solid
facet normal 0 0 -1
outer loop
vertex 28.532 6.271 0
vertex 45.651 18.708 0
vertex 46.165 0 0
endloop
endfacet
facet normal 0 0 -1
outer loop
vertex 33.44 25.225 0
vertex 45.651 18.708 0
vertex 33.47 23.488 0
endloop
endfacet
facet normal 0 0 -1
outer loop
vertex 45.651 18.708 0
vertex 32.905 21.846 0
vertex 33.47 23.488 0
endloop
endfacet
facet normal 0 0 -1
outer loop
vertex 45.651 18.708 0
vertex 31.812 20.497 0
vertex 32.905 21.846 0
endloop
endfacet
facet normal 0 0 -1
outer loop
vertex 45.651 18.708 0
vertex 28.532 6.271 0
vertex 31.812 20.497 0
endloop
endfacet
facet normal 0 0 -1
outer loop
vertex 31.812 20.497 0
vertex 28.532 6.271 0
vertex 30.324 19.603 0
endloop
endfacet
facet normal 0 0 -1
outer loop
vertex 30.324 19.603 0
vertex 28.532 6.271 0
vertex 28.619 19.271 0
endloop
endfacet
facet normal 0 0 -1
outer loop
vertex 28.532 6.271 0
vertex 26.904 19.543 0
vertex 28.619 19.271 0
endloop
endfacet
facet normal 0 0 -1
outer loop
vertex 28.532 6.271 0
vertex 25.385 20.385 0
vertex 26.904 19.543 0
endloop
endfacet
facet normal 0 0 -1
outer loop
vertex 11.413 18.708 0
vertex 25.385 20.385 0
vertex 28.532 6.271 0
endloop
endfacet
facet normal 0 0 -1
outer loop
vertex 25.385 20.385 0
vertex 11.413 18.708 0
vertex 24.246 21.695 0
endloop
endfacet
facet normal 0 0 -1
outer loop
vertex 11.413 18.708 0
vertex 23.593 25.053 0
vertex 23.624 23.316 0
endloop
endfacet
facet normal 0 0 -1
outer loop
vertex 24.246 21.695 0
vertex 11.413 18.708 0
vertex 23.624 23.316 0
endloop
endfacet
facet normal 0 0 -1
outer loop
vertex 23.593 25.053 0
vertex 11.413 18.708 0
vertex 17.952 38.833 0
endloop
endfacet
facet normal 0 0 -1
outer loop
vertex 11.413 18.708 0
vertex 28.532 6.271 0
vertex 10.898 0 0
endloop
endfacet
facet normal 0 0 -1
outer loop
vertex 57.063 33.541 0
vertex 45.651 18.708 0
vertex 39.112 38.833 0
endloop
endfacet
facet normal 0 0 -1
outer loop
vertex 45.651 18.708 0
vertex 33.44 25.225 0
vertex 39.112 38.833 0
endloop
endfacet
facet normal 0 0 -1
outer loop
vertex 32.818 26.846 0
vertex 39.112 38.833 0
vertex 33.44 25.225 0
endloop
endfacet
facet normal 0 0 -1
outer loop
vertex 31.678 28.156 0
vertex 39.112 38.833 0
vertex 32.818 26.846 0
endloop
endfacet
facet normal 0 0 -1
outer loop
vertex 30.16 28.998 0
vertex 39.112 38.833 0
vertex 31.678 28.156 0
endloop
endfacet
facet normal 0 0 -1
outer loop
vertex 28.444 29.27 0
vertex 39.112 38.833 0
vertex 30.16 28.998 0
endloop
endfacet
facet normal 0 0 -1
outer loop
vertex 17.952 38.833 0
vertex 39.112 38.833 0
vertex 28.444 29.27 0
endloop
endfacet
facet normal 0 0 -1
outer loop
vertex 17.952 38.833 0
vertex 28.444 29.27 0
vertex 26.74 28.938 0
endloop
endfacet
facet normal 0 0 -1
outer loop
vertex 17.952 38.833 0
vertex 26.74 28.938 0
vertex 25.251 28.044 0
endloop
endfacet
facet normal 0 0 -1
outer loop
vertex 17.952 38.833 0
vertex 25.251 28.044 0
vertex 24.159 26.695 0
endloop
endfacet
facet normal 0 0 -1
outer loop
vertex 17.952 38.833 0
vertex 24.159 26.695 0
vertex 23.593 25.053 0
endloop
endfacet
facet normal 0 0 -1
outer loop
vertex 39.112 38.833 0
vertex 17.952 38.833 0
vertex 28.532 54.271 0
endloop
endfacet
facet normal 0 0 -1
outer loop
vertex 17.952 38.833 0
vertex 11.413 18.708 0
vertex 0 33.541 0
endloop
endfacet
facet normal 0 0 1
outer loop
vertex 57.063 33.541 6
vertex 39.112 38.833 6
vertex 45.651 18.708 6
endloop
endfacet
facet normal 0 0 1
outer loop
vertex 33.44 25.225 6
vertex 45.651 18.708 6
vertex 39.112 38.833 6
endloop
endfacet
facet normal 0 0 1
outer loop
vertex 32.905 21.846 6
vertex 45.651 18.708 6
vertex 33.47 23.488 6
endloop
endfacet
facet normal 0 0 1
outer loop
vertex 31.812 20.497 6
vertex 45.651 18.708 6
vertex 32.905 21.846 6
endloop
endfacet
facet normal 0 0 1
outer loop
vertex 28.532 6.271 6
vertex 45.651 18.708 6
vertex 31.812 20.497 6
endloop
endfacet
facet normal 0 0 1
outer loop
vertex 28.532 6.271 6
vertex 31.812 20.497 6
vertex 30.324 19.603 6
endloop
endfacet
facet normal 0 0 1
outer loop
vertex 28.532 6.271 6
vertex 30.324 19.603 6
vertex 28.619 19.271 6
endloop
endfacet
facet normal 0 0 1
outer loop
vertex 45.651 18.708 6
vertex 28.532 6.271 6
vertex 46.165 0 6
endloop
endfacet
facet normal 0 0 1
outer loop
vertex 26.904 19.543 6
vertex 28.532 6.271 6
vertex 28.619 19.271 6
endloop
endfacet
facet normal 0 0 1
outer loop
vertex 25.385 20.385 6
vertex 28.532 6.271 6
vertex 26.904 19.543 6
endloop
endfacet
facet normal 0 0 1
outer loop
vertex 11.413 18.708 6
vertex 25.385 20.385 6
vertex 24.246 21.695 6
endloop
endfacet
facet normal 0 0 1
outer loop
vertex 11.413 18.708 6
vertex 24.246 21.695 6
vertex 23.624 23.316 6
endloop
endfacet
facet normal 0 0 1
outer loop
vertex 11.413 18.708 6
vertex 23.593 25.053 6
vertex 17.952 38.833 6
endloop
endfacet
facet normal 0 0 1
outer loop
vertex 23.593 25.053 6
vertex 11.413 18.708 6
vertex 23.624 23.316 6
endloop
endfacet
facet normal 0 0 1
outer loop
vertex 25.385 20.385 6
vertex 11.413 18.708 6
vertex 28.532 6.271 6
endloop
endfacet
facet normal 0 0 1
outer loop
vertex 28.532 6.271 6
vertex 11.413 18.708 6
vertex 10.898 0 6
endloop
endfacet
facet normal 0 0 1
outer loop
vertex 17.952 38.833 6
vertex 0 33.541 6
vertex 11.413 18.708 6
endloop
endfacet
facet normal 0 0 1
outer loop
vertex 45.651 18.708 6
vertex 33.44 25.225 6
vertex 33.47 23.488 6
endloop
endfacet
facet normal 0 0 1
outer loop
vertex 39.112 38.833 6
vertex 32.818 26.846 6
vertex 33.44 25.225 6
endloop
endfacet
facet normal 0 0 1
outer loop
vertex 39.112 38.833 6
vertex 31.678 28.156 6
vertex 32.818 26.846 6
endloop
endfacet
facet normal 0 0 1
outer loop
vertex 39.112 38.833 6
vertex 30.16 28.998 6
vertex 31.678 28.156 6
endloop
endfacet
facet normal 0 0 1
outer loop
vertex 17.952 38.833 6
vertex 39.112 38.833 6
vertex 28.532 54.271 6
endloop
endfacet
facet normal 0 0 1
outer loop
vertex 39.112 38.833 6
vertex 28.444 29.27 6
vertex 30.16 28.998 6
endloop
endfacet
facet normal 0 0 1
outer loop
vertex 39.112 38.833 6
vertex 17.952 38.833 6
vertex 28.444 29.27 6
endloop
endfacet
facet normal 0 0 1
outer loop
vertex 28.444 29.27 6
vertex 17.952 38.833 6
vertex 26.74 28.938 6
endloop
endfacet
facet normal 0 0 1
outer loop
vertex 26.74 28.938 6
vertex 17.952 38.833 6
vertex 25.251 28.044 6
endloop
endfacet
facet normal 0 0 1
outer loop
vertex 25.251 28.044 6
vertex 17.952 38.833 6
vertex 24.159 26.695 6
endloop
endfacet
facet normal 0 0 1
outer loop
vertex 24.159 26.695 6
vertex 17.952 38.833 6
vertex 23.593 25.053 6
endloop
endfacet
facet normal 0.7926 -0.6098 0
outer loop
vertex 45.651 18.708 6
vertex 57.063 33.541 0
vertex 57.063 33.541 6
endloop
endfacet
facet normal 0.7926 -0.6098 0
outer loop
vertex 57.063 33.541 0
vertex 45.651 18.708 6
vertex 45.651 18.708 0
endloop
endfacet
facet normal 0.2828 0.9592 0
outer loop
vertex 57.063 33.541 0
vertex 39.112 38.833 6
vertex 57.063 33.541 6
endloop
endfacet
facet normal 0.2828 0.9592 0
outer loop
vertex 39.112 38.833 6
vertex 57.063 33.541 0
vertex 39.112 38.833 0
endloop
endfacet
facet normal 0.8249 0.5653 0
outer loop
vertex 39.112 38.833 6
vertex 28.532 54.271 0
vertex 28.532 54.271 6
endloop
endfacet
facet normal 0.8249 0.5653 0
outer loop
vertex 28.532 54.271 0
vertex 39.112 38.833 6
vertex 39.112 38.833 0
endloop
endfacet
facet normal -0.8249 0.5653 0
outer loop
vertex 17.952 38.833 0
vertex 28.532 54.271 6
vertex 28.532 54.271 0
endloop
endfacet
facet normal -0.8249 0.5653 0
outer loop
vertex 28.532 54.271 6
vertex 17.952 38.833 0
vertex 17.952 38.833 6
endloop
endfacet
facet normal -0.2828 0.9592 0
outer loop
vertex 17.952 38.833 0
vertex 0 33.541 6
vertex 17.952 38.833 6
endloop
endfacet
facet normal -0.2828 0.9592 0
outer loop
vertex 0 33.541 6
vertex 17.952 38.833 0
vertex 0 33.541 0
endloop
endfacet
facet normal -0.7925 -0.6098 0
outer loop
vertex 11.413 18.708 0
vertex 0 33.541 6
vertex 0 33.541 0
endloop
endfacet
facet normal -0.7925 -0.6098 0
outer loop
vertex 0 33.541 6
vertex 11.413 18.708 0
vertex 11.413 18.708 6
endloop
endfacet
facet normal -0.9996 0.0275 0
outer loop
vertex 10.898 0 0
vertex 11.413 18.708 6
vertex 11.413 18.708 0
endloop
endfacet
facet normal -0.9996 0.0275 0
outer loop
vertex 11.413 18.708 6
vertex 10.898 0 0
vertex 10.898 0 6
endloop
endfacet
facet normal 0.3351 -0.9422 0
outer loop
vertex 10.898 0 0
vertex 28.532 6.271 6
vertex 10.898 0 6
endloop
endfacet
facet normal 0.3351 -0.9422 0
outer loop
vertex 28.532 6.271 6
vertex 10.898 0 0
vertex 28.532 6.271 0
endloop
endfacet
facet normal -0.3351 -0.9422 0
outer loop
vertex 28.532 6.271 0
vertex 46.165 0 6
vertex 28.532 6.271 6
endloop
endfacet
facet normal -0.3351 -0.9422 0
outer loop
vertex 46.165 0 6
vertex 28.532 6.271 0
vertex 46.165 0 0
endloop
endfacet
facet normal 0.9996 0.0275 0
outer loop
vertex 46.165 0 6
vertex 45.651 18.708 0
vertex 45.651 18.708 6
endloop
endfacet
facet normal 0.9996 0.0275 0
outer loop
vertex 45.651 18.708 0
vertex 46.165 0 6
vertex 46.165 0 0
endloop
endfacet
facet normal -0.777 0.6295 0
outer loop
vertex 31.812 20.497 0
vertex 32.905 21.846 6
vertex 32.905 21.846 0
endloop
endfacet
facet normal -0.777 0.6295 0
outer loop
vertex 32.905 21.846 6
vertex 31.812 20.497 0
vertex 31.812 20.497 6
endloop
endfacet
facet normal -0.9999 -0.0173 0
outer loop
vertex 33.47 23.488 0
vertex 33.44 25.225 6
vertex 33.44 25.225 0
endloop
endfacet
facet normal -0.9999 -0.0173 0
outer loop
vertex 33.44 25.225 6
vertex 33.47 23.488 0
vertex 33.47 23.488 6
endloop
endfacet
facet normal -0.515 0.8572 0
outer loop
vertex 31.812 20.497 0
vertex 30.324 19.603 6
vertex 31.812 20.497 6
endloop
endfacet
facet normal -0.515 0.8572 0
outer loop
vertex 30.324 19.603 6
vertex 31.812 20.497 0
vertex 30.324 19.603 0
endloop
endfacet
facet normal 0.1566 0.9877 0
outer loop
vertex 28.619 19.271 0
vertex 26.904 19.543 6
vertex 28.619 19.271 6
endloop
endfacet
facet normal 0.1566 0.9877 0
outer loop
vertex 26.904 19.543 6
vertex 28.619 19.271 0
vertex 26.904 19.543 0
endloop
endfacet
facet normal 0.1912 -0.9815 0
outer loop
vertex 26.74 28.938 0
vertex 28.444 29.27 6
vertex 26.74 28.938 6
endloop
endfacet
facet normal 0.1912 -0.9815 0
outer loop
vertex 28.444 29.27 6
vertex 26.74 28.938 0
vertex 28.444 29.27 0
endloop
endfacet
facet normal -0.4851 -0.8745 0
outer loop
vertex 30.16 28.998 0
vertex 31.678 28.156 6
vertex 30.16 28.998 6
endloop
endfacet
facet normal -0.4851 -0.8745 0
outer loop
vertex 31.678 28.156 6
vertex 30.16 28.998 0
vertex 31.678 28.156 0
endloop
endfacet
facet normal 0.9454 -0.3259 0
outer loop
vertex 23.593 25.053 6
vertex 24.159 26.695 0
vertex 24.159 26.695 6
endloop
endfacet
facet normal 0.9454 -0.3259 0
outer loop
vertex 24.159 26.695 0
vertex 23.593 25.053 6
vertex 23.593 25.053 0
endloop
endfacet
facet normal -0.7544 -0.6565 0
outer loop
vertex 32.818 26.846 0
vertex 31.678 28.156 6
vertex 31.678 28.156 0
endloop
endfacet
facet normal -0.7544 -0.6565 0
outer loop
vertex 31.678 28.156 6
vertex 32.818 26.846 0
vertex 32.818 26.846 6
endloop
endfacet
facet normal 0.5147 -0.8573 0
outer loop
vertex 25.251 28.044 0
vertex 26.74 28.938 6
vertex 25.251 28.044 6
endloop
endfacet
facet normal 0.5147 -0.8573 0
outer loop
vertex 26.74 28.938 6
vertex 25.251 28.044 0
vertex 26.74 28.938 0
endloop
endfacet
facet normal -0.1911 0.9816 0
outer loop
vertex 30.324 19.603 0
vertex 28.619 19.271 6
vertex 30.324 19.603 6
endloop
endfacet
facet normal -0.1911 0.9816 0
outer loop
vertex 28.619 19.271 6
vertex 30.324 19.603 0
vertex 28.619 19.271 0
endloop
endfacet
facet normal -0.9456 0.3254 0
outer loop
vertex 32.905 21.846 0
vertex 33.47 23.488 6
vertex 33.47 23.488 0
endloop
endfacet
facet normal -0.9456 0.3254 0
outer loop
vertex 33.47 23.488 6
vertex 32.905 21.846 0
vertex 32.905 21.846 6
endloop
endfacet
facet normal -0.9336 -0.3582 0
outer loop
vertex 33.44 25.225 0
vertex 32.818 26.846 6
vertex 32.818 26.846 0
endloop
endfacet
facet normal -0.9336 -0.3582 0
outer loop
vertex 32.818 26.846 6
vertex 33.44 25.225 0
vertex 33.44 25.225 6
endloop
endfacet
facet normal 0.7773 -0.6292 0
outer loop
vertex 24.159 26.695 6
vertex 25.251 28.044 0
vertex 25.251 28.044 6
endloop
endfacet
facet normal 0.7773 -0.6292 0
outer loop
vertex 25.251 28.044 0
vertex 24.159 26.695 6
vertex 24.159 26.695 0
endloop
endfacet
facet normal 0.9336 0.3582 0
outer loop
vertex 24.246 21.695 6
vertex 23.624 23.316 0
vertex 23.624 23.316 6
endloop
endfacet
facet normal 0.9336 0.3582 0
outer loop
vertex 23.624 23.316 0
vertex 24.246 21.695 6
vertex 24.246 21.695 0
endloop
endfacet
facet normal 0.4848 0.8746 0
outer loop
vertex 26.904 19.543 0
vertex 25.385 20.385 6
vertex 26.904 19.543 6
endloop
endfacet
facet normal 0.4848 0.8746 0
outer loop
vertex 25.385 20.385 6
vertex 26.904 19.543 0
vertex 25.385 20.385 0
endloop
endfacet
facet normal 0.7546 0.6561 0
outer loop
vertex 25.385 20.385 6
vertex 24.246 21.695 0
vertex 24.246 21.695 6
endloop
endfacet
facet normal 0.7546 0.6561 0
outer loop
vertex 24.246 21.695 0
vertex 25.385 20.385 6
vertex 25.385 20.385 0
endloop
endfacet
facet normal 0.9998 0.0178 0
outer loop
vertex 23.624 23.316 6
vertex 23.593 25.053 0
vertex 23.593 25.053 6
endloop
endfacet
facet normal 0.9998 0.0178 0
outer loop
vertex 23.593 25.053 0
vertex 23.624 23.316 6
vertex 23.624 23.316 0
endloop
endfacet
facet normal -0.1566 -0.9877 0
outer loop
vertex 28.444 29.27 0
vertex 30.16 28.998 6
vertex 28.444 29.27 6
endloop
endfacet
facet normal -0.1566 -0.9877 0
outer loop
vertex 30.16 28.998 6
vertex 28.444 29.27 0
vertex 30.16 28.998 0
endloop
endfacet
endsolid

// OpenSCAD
$fn = 32;

// ----------------------------------------------------------------------
// Star wheel: 5-point blunt, R30
// ----------------------------------------------------------------------

// --- parameters (mm) ---
n_points = 5;             // number of points / teeth
r_out = 30;               // tip radius
r_in = 18;                // root radius
bore_r = 5;               // centre bore radius
plate_t = 6;              // plate thickness, Z (extrusion height)
bore_d = 10;              // centre bore diameter

profile = [[28.532, 54.271], [17.952, 38.833], [0, 33.541], [11.413, 18.708], [10.898, 0], [28.532, 6.271], [46.165, 0], [45.651, 18.708], [57.063, 33.541], [39.112, 38.833]];  // primary outline, 10 points, counter clockwise
void_1 = [[33.44, 25.225], [32.818, 26.846], [31.678, 28.156], [30.16, 28.998], [28.444, 29.27], [26.74, 28.938], [25.251, 28.044], [24.159, 26.695], [23.593, 25.053], [23.624, 23.316], [24.246, 21.695], [25.385, 20.385], [26.904, 19.543], [28.619, 19.271], [30.324, 19.603], [31.812, 20.497], [32.905, 21.846], [33.47, 23.488]];  // centre bore, 18 points

// --- the one profile operation ---
difference() {
  linear_extrude(height = plate_t) polygon(points = profile);
  translate([0, 0, -1])
    linear_extrude(height = plate_t + 2) polygon(points = void_1);
}
